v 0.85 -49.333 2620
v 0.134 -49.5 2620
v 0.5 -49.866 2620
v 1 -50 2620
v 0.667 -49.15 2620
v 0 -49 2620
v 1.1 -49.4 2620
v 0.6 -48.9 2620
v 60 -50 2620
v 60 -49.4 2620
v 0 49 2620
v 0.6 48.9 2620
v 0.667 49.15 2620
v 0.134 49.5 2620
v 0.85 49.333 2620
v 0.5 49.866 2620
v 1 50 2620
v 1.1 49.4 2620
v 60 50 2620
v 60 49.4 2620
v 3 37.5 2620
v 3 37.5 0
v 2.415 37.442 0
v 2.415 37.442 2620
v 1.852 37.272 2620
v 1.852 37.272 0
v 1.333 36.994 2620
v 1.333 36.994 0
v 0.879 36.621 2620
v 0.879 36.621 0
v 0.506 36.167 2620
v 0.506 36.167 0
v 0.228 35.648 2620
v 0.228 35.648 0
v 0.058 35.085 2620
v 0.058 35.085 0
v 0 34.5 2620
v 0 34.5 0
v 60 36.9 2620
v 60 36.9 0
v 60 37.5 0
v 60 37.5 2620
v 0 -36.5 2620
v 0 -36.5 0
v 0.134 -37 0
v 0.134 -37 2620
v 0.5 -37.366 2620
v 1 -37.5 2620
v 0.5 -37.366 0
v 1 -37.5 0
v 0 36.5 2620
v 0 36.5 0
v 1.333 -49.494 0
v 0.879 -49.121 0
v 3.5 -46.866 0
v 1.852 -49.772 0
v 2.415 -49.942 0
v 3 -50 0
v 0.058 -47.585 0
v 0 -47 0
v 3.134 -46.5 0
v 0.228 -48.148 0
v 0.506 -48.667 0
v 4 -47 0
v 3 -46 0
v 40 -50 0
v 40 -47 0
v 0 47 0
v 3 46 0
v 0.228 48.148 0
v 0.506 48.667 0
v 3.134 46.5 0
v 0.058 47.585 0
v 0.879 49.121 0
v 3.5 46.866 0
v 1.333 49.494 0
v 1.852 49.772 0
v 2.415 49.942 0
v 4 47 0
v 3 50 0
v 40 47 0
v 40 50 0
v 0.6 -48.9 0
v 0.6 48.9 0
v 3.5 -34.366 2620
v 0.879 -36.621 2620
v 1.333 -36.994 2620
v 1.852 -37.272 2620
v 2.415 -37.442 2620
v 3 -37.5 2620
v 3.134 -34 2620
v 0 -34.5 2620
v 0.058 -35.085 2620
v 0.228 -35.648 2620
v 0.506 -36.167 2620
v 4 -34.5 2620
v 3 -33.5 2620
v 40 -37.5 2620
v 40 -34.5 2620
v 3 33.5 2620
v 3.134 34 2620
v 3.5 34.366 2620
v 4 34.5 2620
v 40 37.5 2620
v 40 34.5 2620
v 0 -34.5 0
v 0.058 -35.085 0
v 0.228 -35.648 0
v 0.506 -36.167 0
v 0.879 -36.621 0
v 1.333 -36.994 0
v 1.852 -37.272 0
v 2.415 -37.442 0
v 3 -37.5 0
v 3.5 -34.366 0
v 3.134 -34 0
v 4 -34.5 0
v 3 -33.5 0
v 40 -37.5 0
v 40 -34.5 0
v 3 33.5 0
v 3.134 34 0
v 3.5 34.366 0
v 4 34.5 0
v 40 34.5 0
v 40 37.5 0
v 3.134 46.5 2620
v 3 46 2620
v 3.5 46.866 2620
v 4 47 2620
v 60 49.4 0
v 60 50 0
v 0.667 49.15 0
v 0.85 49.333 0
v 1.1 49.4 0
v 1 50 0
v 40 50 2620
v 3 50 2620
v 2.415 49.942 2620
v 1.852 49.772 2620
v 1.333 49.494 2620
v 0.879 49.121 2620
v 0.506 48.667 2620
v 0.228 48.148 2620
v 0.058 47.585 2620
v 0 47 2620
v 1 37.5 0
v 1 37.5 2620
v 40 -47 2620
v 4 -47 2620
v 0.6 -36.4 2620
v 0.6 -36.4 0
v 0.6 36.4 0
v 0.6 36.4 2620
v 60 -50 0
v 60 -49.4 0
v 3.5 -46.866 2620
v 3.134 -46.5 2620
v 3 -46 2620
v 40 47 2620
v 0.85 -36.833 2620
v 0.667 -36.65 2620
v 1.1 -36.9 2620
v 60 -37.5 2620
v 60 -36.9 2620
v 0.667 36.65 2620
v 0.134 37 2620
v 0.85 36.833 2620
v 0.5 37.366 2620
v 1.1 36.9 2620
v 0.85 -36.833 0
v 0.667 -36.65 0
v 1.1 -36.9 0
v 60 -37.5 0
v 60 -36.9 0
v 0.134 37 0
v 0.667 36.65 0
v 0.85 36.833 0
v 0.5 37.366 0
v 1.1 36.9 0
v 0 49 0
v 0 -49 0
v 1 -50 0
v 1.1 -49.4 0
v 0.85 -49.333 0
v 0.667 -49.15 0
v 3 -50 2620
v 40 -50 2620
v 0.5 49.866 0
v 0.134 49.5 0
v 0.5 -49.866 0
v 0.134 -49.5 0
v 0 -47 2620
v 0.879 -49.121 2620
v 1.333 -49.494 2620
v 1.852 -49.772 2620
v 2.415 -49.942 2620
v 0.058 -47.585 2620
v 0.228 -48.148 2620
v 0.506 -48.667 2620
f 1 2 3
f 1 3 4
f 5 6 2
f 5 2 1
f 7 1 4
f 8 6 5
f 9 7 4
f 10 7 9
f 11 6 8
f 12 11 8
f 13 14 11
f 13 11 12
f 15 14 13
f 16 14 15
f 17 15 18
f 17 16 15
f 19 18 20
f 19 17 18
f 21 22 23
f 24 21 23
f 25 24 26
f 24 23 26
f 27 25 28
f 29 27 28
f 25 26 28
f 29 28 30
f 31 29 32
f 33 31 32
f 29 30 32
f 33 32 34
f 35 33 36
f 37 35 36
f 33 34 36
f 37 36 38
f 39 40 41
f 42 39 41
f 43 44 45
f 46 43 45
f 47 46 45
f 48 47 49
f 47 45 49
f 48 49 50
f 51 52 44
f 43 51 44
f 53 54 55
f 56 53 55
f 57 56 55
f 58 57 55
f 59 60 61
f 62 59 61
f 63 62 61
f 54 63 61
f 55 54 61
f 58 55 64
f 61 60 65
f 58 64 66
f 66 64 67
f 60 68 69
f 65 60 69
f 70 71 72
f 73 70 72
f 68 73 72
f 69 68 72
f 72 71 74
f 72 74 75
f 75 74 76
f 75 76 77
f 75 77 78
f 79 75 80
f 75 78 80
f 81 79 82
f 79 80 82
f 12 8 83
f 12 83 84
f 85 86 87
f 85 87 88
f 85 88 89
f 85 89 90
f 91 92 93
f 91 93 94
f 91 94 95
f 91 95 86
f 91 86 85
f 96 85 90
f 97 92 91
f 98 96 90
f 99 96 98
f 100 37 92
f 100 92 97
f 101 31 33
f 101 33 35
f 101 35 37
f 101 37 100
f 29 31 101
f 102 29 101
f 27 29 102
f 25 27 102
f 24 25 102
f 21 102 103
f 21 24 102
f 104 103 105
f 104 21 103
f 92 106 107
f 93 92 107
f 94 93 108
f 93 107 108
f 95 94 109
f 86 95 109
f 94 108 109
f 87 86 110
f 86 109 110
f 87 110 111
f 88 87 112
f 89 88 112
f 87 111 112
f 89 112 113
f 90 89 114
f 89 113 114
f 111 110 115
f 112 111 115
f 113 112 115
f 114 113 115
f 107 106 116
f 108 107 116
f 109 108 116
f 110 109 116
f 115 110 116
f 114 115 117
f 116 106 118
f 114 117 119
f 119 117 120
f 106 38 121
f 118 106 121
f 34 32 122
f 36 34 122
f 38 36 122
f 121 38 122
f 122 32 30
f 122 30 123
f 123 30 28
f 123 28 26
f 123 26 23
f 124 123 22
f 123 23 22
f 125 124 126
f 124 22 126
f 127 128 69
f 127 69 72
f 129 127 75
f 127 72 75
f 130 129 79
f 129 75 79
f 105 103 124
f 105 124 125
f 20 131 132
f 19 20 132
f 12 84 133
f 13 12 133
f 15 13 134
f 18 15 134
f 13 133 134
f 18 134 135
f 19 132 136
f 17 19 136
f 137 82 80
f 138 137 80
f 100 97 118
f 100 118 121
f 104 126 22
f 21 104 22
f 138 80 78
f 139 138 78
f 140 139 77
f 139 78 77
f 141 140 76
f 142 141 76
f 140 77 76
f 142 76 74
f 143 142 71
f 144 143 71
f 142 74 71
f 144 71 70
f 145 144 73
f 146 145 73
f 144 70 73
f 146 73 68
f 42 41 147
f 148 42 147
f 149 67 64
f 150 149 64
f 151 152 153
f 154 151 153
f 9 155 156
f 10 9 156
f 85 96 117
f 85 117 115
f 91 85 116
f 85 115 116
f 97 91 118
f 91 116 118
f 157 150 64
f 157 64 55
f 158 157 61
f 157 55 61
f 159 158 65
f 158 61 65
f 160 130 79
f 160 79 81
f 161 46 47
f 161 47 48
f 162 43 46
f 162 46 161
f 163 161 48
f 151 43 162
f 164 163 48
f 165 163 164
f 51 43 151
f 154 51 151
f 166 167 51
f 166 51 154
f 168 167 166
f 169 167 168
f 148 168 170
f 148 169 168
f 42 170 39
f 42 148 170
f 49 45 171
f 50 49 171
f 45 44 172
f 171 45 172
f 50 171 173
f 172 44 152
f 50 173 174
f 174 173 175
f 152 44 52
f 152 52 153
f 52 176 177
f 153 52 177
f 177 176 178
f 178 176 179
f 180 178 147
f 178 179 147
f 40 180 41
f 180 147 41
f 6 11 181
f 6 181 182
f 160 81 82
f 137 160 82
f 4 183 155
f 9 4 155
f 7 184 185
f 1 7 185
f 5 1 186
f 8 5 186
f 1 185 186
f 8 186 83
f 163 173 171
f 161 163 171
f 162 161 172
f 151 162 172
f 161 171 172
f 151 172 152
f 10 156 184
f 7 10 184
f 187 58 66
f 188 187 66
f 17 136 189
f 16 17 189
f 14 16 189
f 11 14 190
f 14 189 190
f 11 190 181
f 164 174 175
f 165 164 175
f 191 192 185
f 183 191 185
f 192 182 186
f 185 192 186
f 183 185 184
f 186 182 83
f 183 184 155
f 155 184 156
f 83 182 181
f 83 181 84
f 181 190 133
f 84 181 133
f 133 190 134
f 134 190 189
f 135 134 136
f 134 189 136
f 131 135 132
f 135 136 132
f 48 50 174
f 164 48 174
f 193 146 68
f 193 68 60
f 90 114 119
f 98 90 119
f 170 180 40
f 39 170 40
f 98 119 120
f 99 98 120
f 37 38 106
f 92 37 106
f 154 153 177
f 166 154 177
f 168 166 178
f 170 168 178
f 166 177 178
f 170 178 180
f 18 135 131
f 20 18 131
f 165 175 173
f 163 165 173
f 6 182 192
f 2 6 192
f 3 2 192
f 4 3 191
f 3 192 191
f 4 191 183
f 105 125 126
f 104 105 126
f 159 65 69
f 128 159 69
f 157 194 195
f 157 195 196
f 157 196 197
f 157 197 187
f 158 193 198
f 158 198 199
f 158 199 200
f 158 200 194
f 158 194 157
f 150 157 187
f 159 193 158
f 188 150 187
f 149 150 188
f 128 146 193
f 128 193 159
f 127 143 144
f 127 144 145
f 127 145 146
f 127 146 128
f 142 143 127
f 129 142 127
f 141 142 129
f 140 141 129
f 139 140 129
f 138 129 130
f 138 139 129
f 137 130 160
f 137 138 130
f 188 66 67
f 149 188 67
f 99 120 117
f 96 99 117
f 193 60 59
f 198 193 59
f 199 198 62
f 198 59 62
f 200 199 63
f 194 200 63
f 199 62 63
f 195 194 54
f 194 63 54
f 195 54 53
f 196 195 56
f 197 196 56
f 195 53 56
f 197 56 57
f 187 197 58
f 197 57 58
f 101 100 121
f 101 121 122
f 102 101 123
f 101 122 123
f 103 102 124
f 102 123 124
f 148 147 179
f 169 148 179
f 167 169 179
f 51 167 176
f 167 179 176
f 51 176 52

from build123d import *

# Parameters (mm, degrees)
F1_DEPTH = 2620
F3_DEPTH = 2620
F5_DEPTH = 2620
F7_DEPTH = 2620


with BuildPart() as f1:
    # F0 (on Top) → F1 (new body)
    with BuildSketch(Plane.XY):
        with BuildLine():
            Line((40, 37.5), (3, 37.5))
            ThreePointArc((3, 37.5), (0.87868, 36.62132), (0, 34.5))
            Line((0, 34.5), (0, -34.5))
            ThreePointArc((0, -34.5), (0.87868, -36.62132), (3, -37.5))
            Line((3, -37.5), (40, -37.5))
            Line((40, -37.5), (40, -34.5))
            Line((40, -34.5), (4, -34.5))
            ThreePointArc((4, -34.5), (3.292893, -34.207107), (3, -33.5))
            Line((3, -33.5), (3, 33.5))
            ThreePointArc((3, 33.5), (3.292893, 34.207107), (4, 34.5))
            Line((4, 34.5), (40, 34.5))
            Line((40, 34.5), (40, 37.5))
        make_face()
    extrude(amount=F1_DEPTH)


with BuildPart() as f3:
    # F2 (on Top) → F3 (new body)
    with BuildSketch(Plane.XY):
        with BuildLine():
            Line((40, 50), (3, 50))
            ThreePointArc((3, 50), (0.87868, 49.12132), (0, 47))
            Line((0, 47), (0, -47))
            ThreePointArc((0, -47), (0.87868, -49.12132), (3, -50))
            Line((3, -50), (40, -50))
            Line((40, -50), (40, -47))
            Line((40, -47), (4, -47))
            ThreePointArc((4, -47), (3.292893, -46.707107), (3, -46))
            Line((3, -46), (3, 46))
            ThreePointArc((3, 46), (3.292893, 46.707107), (4, 47))
            Line((4, 47), (40, 47))
            Line((40, 47), (40, 50))
        make_face()
    extrude(amount=F3_DEPTH)


with BuildPart() as f5:
    # F4 (on Top) → F5 (new body)
    with BuildSketch(Plane.XY):
        with BuildLine():
            Line((60, 37.5), (1, 37.5))
            ThreePointArc((1, 37.5), (0.292893, 37.207107), (0, 36.5))
            Line((0, 36.5), (0, -36.5))
            ThreePointArc((0, -36.5), (0.292893, -37.207107), (1, -37.5))
            Line((1, -37.5), (60, -37.5))
            Line((60, -37.5), (60, -36.9))
            Line((60, -36.9), (1.1, -36.9))
            ThreePointArc((1.1, -36.9), (0.746447, -36.753553), (0.6, -36.4))
            Line((0.6, -36.4), (0.6, 36.4))
            ThreePointArc((0.6, 36.4), (0.746447, 36.753553), (1.1, 36.9))
            Line((1.1, 36.9), (60, 36.9))
            Line((60, 36.9), (60, 37.5))
        make_face()
    extrude(amount=F5_DEPTH)


with BuildPart() as f7:
    # F6 (on Top) → F7 (new body)
    with BuildSketch(Plane.XY):
        with BuildLine():
            Line((60, 50), (1, 50))
            ThreePointArc((1, 50), (0.292893, 49.707107), (0, 49))
            Line((0, 49), (0, -49))
            ThreePointArc((0, -49), (0.292893, -49.707107), (1, -50))
            Line((1, -50), (60, -50))
            Line((60, -50), (60, -49.4))
            Line((60, -49.4), (1.1, -49.4))
            ThreePointArc((1.1, -49.4), (0.746447, -49.253553), (0.6, -48.9))
            Line((0.6, -48.9), (0.6, 48.9))
            ThreePointArc((0.6, 48.9), (0.746447, 49.253553), (1.1, 49.4))
            Line((1.1, 49.4), (60, 49.4))
            Line((60, 49.4), (60, 50))
        make_face()
    extrude(amount=F7_DEPTH)


solid = Compound([f1.part, f3.part, f5.part, f7.part])
